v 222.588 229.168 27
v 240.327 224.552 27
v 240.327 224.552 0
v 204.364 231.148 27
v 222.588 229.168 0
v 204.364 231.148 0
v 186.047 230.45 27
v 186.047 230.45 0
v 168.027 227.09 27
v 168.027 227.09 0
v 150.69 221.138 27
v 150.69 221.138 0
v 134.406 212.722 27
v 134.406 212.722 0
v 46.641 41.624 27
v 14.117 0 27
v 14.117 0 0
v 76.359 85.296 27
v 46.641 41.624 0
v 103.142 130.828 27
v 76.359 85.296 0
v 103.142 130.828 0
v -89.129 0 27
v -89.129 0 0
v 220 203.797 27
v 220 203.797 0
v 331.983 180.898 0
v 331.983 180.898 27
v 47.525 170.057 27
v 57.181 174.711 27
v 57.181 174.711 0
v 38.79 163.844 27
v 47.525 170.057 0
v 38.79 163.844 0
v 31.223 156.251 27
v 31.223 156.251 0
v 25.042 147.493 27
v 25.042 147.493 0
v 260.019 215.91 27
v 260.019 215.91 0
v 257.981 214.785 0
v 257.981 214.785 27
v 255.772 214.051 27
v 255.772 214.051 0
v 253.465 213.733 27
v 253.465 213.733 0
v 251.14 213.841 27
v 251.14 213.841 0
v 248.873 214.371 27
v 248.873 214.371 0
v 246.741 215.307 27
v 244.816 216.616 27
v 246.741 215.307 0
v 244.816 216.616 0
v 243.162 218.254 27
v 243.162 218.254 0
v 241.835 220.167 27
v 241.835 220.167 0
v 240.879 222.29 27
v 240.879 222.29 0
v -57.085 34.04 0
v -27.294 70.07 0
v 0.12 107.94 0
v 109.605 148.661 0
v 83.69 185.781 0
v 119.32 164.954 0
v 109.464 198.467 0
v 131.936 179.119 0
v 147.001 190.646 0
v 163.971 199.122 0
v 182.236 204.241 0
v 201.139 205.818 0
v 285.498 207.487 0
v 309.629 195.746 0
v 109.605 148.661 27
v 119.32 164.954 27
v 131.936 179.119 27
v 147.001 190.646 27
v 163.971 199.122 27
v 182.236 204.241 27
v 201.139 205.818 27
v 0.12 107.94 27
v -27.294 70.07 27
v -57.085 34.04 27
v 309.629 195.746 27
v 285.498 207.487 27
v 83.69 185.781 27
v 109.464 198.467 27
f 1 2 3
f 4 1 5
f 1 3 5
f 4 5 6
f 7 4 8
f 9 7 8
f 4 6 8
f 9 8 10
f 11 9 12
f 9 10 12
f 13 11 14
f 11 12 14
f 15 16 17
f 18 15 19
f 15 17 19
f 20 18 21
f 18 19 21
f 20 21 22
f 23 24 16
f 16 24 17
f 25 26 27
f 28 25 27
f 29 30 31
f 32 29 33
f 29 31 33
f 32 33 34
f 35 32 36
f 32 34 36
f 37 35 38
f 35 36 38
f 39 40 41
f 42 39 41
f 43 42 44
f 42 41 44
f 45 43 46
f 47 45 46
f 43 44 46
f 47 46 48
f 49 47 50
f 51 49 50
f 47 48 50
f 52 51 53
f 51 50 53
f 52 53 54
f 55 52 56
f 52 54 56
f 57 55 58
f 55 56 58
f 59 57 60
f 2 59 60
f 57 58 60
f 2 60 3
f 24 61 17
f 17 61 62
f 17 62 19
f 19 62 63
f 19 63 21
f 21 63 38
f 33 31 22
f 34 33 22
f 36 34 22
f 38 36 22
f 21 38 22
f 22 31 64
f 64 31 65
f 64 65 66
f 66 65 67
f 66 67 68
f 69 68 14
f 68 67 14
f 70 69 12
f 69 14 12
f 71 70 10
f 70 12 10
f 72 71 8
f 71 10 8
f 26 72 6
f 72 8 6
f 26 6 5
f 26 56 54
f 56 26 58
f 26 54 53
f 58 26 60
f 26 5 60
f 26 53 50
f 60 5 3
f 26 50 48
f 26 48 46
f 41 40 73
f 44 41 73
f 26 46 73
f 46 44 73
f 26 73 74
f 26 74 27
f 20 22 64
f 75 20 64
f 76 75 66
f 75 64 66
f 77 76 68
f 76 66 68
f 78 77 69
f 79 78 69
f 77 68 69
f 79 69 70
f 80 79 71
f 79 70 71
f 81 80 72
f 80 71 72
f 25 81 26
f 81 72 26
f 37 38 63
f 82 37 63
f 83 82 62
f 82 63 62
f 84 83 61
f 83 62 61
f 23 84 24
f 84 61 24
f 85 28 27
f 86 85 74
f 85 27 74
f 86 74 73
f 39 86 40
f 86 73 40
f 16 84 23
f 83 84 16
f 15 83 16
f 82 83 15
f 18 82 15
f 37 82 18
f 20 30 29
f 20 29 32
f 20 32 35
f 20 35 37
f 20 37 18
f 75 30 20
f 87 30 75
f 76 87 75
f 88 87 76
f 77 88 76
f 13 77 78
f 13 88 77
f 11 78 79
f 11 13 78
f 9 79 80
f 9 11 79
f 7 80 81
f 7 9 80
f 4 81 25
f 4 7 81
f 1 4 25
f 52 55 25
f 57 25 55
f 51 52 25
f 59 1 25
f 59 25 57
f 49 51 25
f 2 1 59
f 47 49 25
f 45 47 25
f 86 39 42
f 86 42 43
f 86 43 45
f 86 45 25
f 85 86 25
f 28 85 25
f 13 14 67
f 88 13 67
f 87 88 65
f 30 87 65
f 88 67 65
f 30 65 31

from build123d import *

# Parameters (mm, degrees)
F1_DEPTH = 27
F2_W     = 403.082937
F2_H     = 389.70685
F3_DEPTH = 50


with BuildPart() as f1:
    # F0 (on Top) → F1 (new body)
    with BuildSketch(Plane.XY):
        with BuildLine():
            ThreePointArc((103.141751, 130.827628), (147.000525, 190.646497), (220.000119, 203.797485))
            Line((220.000119, 203.797485), (331.982739, 180.898076))
            ThreePointArc((331.982739, 180.898076), (297.759937, 202.019334), (260.019282, 215.909999))
            ThreePointArc((260.019282, 215.909999), (247.785722, 214.790312), (240.327458, 224.551869))
            ThreePointArc((240.327458, 224.551869), (186.047212, 230.450127), (134.405585, 212.722269))
            ThreePointArc((134.405585, 212.722269), (96.675345, 191.925026), (57.181264, 174.711255))
            ThreePointArc((57.181264, 174.711255), (38.789615, 163.844419), (25.042325, 147.493489))
            ThreePointArc((25.042325, 147.493489), (-75.160431, 14.302014), (-203.064791, -92.567234))
            ThreePointArc((-203.064791, -92.567234), (-248.600788, -164.483519), (-272.445342, -246.19592))
            Line((-272.445342, -246.19592), (-253.424359, -365.238374))
            ThreePointArc((-253.424359, -365.238374), (-248.03197, -364.036727), (-243.660012, -360.659182))
            ThreePointArc((-243.660012, -360.659182), (-226.474264, -324.191868), (-229.146522, -283.966577))
            ThreePointArc((-229.146522, -283.966577), (-222.505303, -205.585554), (-161.231884, -156.257483))
            ThreePointArc((-161.231884, -156.257483), (-11.343038, -29.016538), (103.141751, 130.827628))
        make_face()
    extrude(amount=F1_DEPTH)

    # F2 (on Top) → F3 (cut)
    with BuildSketch(Plane.XY):
        with Locations((-121.900424, -194.853425)):
            Rectangle(F2_W, F2_H)
    extrude(amount=F3_DEPTH, mode=Mode.SUBTRACT)


solid = f1.part
